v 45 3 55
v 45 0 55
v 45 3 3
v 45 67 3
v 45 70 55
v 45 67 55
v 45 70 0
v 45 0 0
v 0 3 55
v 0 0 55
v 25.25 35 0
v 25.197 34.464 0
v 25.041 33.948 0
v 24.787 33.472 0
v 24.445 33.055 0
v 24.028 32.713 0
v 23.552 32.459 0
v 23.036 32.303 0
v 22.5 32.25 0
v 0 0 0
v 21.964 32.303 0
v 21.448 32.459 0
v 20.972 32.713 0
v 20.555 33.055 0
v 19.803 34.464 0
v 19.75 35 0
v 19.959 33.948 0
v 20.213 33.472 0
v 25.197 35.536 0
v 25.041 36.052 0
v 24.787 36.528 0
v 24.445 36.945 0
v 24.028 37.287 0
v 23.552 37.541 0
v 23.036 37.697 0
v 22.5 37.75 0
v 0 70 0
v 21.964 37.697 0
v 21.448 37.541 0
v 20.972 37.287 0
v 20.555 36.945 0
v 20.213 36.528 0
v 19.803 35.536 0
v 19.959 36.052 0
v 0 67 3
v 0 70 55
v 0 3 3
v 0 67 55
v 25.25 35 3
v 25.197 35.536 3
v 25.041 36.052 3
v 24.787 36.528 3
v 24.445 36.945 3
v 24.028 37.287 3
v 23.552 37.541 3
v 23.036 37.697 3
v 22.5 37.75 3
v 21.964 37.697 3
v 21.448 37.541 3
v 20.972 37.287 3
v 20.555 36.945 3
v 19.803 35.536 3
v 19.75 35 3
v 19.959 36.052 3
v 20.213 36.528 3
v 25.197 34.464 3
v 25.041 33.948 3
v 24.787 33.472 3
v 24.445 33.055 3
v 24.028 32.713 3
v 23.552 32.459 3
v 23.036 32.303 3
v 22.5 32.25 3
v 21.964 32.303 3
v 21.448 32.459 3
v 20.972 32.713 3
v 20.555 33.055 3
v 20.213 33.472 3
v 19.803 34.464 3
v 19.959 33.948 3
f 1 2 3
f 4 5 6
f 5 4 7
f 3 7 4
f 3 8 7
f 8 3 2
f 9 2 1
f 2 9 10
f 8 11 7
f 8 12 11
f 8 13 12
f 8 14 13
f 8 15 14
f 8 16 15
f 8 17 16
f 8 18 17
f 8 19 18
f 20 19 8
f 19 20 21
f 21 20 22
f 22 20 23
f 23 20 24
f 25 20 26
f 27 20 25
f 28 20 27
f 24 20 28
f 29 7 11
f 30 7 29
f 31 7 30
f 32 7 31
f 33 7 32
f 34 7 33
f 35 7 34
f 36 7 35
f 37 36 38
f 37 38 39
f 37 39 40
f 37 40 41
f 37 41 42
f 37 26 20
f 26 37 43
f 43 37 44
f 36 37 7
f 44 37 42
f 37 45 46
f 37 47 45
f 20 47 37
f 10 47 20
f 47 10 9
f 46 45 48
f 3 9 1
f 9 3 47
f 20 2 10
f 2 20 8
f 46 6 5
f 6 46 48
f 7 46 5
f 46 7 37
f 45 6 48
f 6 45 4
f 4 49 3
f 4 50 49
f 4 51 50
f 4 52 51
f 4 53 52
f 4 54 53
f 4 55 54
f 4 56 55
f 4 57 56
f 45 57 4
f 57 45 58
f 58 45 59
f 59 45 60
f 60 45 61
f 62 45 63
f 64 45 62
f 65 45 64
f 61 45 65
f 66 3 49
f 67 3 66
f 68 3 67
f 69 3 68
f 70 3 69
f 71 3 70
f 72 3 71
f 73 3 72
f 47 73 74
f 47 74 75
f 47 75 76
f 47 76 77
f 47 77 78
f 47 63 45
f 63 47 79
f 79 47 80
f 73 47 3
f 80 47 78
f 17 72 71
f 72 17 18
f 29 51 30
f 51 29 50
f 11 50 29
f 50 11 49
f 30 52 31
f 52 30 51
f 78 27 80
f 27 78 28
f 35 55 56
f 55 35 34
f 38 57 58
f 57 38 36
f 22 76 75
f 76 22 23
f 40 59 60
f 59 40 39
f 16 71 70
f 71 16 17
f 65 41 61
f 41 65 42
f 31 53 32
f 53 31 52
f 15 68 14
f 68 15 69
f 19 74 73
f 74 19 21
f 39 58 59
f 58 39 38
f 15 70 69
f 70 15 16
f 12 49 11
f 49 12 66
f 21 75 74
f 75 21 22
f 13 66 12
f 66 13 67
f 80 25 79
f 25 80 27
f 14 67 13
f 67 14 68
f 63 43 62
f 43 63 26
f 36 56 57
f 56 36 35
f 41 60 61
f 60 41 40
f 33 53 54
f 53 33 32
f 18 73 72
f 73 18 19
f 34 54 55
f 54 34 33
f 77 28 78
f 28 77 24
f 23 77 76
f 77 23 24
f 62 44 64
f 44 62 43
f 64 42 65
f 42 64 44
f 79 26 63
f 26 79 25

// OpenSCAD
$fn = 32;

// ----------------------------------------------------------------------
// U-bracket: 45 x 70 x 55 mm
// ----------------------------------------------------------------------

// --- parameters (mm) ---
rail_len = 45;            // outer length, X
jaw_w = 70;               // outer width, Y
jaw_h = 55;               // upright height, Z
web_t = 3;                // wall thickness
hole_d = 5.5;             // clearance for M5

module hole_z(px, py) {
  translate([px, py, -2.5]) cylinder(h = web_t + 5, d = hole_d);
}
module hole_y_pz(pz) {
  /* through both uprights along Y */
  translate([0, -2.5, pz]) rotate([-90, 0, 0]) cylinder(h = jaw_w + 5, d = hole_d);
}

module base() {
  cube([rail_len, jaw_w, web_t]);
}

module uprights() {
  cube([rail_len, web_t, jaw_h]);
  translate([0, jaw_w - web_t, 0]) cube([rail_len, web_t, jaw_h]);
}

difference() {
  union() {
    base();
    uprights();
  }
  hole_z(22.5, 35);
}
